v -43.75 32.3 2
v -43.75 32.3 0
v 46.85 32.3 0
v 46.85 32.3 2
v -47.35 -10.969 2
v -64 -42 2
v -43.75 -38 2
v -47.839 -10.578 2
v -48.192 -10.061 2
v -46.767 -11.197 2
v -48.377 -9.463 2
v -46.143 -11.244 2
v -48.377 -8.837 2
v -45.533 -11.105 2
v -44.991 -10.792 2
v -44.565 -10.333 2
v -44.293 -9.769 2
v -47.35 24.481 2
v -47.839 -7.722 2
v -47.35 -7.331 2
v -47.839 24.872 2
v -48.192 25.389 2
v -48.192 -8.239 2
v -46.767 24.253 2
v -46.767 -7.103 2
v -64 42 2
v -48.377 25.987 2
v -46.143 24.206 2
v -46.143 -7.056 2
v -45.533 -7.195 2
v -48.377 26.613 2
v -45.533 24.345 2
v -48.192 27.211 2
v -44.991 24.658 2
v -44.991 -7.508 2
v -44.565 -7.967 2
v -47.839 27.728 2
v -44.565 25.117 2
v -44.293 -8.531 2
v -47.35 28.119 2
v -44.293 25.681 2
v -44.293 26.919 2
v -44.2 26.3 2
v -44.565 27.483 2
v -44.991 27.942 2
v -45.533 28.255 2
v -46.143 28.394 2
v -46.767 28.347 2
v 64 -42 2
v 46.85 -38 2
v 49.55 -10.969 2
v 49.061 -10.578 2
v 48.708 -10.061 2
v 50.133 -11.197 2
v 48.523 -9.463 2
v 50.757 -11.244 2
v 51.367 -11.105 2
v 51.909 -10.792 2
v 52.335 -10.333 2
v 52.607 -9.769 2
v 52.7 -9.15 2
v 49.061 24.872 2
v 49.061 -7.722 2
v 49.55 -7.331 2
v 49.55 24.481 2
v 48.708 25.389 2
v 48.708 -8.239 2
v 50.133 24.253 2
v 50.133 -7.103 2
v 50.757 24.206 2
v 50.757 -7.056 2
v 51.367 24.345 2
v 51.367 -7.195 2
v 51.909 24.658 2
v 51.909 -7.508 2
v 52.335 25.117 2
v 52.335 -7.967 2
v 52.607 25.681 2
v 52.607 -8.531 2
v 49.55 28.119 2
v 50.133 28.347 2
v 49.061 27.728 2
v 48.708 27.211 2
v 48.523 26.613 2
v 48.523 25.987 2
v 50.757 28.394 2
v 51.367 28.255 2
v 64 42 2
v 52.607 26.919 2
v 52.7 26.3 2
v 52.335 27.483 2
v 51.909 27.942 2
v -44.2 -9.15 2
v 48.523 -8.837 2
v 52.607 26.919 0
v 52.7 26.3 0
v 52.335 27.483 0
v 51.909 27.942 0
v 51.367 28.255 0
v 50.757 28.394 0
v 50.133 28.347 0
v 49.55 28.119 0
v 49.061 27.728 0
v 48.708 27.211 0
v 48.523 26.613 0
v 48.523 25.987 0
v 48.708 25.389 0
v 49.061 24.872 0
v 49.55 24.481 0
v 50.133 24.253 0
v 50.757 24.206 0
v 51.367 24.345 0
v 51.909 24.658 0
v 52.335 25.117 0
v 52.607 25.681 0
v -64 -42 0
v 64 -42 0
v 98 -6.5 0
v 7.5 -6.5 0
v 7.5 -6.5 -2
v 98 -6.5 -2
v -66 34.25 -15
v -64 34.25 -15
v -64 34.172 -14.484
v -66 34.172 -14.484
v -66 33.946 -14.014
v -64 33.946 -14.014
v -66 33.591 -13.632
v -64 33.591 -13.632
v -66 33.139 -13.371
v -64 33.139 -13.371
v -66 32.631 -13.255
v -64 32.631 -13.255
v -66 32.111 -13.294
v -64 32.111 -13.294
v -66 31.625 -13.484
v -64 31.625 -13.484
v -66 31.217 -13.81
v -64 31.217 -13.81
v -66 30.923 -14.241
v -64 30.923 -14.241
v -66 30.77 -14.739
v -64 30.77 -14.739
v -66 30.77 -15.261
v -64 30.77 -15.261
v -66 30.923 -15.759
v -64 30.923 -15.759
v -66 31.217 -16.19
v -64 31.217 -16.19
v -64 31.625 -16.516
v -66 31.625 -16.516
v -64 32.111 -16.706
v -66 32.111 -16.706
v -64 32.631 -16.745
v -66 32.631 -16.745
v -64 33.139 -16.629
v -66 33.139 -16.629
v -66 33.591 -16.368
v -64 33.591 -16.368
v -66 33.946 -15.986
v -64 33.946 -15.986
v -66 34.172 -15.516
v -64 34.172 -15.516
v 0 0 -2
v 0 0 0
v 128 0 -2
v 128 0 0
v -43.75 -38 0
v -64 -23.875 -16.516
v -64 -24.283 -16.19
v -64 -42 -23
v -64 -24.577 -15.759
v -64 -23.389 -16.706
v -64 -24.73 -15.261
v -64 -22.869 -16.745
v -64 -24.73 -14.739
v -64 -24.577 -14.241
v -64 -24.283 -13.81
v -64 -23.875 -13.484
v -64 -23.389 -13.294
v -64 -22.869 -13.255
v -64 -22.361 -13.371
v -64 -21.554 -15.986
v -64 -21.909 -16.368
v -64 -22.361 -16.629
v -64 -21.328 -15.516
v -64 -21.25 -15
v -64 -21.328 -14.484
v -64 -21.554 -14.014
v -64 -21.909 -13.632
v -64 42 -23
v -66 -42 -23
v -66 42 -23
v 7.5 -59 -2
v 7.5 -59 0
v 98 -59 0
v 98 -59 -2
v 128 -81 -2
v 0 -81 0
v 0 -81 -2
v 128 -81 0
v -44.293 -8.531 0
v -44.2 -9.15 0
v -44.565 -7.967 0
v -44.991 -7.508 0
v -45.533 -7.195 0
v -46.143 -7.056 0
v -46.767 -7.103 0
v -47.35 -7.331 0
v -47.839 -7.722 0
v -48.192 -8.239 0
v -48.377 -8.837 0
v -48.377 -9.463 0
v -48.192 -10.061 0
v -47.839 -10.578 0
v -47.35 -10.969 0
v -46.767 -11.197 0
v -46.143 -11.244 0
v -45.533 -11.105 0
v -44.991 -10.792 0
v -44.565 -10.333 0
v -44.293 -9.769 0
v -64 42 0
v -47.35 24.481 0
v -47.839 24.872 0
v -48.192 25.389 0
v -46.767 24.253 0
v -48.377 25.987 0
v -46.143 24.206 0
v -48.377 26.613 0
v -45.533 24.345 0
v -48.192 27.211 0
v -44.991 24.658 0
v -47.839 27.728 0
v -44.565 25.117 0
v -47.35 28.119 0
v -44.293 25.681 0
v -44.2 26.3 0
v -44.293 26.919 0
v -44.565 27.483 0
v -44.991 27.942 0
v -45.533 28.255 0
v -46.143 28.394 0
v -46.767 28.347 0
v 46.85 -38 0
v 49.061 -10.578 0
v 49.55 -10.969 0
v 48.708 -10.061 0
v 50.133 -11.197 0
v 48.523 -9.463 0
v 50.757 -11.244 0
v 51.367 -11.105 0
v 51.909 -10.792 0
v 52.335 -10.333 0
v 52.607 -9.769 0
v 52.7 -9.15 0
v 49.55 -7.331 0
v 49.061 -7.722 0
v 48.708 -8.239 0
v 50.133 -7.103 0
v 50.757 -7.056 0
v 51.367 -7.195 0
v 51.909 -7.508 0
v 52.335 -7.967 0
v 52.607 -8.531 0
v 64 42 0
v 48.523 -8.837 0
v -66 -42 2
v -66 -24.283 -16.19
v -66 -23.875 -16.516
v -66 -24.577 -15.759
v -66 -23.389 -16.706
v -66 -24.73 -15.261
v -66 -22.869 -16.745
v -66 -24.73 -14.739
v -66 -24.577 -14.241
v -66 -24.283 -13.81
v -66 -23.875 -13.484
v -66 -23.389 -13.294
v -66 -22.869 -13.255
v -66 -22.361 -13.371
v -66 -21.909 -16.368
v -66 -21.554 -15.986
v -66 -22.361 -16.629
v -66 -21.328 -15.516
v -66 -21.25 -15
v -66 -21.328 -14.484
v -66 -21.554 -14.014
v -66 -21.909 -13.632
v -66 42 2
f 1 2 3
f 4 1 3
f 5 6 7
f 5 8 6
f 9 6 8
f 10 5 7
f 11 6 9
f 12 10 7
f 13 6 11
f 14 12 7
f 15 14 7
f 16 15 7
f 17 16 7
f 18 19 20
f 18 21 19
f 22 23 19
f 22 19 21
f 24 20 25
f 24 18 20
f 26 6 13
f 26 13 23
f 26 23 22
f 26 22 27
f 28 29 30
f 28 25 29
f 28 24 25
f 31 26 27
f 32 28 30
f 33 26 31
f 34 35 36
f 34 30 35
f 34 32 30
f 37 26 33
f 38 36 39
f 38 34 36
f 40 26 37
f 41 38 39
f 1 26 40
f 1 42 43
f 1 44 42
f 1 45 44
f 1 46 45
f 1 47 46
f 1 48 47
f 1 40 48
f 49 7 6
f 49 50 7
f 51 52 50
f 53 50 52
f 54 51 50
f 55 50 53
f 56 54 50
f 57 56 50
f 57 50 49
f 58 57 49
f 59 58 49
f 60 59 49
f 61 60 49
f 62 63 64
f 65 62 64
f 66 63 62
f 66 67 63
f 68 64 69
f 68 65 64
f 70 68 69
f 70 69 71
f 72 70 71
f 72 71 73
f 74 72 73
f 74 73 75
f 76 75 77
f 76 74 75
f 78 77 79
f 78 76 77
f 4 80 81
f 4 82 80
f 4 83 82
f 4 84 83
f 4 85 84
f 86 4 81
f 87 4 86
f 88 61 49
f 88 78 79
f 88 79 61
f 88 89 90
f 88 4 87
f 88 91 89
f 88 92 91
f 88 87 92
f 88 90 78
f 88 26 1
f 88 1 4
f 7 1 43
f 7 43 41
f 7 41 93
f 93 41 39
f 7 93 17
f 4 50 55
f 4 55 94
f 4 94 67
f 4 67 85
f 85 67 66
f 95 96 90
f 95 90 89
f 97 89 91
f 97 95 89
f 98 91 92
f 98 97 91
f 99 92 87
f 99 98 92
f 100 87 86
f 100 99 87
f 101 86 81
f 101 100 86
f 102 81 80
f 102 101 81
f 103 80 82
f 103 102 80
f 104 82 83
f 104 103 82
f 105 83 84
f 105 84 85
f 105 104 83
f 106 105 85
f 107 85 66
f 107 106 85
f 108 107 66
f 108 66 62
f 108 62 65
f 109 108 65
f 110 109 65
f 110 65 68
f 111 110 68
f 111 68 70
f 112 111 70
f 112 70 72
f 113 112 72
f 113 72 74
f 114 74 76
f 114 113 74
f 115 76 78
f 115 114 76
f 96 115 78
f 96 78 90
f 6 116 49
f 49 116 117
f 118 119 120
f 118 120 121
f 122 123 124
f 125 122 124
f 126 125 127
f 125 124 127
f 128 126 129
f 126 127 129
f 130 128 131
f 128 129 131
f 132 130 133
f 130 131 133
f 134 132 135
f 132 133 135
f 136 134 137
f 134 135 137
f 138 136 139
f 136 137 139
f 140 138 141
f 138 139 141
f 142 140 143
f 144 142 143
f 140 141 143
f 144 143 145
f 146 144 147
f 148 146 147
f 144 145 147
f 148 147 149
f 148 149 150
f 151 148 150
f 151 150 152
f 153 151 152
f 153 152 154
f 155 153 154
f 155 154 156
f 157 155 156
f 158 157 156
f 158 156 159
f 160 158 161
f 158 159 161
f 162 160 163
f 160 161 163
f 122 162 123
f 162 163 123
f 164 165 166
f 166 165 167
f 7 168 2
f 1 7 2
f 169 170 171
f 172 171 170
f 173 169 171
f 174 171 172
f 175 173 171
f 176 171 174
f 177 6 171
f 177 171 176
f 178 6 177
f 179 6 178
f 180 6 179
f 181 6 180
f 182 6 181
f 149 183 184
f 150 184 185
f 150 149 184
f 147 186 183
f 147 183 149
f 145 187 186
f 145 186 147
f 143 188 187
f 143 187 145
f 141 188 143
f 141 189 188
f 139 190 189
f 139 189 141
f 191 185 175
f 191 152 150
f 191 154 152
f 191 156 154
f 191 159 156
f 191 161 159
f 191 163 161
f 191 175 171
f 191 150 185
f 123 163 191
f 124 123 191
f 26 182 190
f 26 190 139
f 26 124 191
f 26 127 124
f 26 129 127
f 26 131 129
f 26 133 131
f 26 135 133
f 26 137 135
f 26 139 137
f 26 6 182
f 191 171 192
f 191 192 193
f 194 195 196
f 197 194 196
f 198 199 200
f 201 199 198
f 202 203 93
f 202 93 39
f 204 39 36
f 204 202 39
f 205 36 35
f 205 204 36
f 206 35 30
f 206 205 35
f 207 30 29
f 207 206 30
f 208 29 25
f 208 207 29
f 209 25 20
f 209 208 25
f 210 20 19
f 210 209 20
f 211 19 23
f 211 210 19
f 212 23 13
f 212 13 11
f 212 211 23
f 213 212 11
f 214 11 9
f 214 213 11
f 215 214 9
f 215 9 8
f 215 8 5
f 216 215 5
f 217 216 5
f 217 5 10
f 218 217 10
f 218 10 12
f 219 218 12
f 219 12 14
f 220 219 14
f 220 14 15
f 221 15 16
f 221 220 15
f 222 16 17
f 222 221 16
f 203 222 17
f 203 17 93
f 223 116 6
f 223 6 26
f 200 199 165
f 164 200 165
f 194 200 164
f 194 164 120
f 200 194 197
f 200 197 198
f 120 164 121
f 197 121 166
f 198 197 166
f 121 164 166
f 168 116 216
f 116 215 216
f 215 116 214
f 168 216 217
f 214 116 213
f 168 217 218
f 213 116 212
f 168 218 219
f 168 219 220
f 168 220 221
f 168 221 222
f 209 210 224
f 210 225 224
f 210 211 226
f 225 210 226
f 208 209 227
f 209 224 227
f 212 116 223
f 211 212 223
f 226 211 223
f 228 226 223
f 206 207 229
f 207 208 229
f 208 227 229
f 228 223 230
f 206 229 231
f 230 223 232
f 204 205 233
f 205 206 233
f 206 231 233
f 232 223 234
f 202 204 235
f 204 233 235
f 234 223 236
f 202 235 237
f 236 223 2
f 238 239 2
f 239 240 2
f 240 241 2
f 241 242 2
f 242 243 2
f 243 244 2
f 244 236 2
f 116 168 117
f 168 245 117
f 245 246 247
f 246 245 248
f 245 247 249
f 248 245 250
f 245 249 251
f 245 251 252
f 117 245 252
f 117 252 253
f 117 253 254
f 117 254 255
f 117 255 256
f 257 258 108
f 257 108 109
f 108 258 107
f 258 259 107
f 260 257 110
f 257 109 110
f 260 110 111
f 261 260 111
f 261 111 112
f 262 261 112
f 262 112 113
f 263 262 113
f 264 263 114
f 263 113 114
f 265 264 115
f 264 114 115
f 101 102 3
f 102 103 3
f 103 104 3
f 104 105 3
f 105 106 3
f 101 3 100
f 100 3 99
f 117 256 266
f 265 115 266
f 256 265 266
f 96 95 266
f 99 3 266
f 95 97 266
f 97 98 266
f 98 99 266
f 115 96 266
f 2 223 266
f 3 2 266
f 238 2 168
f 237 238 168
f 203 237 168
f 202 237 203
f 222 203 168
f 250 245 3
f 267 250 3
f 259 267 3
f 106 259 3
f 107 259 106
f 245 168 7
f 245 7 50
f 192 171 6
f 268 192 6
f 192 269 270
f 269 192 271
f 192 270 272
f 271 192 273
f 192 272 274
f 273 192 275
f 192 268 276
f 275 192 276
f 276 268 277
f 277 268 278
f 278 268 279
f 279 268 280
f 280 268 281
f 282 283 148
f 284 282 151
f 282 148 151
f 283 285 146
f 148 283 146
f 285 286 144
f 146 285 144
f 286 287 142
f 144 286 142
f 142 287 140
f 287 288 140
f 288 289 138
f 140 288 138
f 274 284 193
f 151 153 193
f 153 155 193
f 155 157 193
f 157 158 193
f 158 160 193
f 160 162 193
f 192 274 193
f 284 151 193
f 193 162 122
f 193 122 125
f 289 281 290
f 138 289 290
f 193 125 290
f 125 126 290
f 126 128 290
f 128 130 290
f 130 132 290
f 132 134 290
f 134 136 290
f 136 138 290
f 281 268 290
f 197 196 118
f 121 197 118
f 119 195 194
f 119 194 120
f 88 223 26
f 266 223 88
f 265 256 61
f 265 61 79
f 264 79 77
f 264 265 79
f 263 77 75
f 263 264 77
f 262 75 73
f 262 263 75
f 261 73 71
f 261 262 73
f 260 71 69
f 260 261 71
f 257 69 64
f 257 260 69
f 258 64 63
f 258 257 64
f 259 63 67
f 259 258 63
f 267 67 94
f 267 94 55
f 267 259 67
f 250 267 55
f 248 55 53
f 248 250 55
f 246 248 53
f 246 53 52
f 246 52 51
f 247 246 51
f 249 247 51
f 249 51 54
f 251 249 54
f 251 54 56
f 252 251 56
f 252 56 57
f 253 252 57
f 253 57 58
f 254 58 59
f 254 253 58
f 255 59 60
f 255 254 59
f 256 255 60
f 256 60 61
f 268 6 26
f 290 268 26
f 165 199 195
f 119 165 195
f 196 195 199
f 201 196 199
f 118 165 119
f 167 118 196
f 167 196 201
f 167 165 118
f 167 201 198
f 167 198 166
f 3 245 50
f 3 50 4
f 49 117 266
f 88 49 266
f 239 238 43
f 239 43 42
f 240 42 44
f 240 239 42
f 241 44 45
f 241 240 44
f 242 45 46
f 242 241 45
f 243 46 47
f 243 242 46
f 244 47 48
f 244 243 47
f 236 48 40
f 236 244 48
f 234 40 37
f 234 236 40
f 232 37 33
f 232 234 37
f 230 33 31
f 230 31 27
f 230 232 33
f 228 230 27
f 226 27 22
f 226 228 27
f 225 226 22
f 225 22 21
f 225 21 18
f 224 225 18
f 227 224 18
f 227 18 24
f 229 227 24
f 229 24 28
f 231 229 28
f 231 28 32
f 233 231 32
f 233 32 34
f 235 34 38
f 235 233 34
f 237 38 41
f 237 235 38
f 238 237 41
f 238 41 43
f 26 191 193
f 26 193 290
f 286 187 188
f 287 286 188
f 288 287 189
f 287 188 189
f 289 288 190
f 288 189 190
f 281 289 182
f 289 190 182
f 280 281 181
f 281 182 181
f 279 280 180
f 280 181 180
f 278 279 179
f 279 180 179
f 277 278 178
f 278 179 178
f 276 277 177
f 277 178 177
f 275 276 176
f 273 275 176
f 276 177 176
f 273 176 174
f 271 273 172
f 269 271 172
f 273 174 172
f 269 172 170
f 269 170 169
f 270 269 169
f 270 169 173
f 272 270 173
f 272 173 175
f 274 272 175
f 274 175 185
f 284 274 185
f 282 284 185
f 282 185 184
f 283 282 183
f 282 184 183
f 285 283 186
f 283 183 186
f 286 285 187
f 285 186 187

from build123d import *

# Parameters (mm, degrees)
SKETCH001_W      = 128
SKETCH001_H      = 81
EXTRUDE_DEPTH    = 2
SKETCH002_W      = 90.5
SKETCH002_H      = 52.5
POCKET_DEPTH     = 2.001
SKETCH003_W      = 128
SKETCH003_H      = 84
SKETCH003_R      = 2.1
SKETCH003_W_2    = 90.6
SKETCH003_H_2    = 70.3
PAD_DEPTH        = 2
SKETCH004_W      = 84
SKETCH004_H      = 25
SKETCH004_R      = 1.75
EXTRUDE001_DEPTH = 2


with BuildPart() as pocket:
    # Sketch001 → Extrude (new body)
    with BuildSketch(Plane.XY):
        with Locations((64, -40.5)):
            Rectangle(SKETCH001_W, SKETCH001_H)
    extrude(amount=-EXTRUDE_DEPTH)

    # Sketch002 (on Face6 of Extrude) → Pocket (cut, through all)
    with BuildSketch(Plane.XY):
        with Locations((52.75, -32.75)):
            Rectangle(SKETCH002_W, SKETCH002_H)
    extrude(amount=-POCKET_DEPTH, mode=Mode.SUBTRACT)


with BuildPart() as body001:
    # Sketch003 → Pad (new body)
    with BuildSketch(Plane.XY):
        Rectangle(SKETCH003_W, SKETCH003_H)
        with Locations((-46.3, 26.3)):
            Circle(SKETCH003_R, mode=Mode.SUBTRACT)
        with Locations((-46.3, -9.15)):
            Circle(SKETCH003_R, mode=Mode.SUBTRACT)
        with Locations((50.6, -9.15)):
            Circle(SKETCH003_R, mode=Mode.SUBTRACT)
        with Locations((50.6, 26.3)):
            Circle(SKETCH003_R, mode=Mode.SUBTRACT)
        with Locations((1.55, -2.85)):
            Rectangle(SKETCH003_W_2, SKETCH003_H_2, mode=Mode.SUBTRACT)
    extrude(amount=PAD_DEPTH)


with BuildPart() as extrude001:
    # Sketch004 (on Face2 of Pad) → Extrude001 (new body)
    with BuildSketch(Plane.YZ.offset(64)):
        with Locations((0, -10.5)):
            Rectangle(SKETCH004_W, SKETCH004_H)
        with Locations((-23, -15)):
            Circle(SKETCH004_R, mode=Mode.SUBTRACT)
        with Locations((32.5, -15)):
            Circle(SKETCH004_R, mode=Mode.SUBTRACT)
    extrude(amount=EXTRUDE001_DEPTH)


with BuildPart() as part_mirroring:
    # Part__Mirroring: instance of Extrude001
    add(extrude001.part.mirror(Plane(origin=(0, 0, 0), x_dir=(0, -1, 0), z_dir=(1, 0, 0))))


solid = Compound([pocket.part, body001.part, part_mirroring.part])
